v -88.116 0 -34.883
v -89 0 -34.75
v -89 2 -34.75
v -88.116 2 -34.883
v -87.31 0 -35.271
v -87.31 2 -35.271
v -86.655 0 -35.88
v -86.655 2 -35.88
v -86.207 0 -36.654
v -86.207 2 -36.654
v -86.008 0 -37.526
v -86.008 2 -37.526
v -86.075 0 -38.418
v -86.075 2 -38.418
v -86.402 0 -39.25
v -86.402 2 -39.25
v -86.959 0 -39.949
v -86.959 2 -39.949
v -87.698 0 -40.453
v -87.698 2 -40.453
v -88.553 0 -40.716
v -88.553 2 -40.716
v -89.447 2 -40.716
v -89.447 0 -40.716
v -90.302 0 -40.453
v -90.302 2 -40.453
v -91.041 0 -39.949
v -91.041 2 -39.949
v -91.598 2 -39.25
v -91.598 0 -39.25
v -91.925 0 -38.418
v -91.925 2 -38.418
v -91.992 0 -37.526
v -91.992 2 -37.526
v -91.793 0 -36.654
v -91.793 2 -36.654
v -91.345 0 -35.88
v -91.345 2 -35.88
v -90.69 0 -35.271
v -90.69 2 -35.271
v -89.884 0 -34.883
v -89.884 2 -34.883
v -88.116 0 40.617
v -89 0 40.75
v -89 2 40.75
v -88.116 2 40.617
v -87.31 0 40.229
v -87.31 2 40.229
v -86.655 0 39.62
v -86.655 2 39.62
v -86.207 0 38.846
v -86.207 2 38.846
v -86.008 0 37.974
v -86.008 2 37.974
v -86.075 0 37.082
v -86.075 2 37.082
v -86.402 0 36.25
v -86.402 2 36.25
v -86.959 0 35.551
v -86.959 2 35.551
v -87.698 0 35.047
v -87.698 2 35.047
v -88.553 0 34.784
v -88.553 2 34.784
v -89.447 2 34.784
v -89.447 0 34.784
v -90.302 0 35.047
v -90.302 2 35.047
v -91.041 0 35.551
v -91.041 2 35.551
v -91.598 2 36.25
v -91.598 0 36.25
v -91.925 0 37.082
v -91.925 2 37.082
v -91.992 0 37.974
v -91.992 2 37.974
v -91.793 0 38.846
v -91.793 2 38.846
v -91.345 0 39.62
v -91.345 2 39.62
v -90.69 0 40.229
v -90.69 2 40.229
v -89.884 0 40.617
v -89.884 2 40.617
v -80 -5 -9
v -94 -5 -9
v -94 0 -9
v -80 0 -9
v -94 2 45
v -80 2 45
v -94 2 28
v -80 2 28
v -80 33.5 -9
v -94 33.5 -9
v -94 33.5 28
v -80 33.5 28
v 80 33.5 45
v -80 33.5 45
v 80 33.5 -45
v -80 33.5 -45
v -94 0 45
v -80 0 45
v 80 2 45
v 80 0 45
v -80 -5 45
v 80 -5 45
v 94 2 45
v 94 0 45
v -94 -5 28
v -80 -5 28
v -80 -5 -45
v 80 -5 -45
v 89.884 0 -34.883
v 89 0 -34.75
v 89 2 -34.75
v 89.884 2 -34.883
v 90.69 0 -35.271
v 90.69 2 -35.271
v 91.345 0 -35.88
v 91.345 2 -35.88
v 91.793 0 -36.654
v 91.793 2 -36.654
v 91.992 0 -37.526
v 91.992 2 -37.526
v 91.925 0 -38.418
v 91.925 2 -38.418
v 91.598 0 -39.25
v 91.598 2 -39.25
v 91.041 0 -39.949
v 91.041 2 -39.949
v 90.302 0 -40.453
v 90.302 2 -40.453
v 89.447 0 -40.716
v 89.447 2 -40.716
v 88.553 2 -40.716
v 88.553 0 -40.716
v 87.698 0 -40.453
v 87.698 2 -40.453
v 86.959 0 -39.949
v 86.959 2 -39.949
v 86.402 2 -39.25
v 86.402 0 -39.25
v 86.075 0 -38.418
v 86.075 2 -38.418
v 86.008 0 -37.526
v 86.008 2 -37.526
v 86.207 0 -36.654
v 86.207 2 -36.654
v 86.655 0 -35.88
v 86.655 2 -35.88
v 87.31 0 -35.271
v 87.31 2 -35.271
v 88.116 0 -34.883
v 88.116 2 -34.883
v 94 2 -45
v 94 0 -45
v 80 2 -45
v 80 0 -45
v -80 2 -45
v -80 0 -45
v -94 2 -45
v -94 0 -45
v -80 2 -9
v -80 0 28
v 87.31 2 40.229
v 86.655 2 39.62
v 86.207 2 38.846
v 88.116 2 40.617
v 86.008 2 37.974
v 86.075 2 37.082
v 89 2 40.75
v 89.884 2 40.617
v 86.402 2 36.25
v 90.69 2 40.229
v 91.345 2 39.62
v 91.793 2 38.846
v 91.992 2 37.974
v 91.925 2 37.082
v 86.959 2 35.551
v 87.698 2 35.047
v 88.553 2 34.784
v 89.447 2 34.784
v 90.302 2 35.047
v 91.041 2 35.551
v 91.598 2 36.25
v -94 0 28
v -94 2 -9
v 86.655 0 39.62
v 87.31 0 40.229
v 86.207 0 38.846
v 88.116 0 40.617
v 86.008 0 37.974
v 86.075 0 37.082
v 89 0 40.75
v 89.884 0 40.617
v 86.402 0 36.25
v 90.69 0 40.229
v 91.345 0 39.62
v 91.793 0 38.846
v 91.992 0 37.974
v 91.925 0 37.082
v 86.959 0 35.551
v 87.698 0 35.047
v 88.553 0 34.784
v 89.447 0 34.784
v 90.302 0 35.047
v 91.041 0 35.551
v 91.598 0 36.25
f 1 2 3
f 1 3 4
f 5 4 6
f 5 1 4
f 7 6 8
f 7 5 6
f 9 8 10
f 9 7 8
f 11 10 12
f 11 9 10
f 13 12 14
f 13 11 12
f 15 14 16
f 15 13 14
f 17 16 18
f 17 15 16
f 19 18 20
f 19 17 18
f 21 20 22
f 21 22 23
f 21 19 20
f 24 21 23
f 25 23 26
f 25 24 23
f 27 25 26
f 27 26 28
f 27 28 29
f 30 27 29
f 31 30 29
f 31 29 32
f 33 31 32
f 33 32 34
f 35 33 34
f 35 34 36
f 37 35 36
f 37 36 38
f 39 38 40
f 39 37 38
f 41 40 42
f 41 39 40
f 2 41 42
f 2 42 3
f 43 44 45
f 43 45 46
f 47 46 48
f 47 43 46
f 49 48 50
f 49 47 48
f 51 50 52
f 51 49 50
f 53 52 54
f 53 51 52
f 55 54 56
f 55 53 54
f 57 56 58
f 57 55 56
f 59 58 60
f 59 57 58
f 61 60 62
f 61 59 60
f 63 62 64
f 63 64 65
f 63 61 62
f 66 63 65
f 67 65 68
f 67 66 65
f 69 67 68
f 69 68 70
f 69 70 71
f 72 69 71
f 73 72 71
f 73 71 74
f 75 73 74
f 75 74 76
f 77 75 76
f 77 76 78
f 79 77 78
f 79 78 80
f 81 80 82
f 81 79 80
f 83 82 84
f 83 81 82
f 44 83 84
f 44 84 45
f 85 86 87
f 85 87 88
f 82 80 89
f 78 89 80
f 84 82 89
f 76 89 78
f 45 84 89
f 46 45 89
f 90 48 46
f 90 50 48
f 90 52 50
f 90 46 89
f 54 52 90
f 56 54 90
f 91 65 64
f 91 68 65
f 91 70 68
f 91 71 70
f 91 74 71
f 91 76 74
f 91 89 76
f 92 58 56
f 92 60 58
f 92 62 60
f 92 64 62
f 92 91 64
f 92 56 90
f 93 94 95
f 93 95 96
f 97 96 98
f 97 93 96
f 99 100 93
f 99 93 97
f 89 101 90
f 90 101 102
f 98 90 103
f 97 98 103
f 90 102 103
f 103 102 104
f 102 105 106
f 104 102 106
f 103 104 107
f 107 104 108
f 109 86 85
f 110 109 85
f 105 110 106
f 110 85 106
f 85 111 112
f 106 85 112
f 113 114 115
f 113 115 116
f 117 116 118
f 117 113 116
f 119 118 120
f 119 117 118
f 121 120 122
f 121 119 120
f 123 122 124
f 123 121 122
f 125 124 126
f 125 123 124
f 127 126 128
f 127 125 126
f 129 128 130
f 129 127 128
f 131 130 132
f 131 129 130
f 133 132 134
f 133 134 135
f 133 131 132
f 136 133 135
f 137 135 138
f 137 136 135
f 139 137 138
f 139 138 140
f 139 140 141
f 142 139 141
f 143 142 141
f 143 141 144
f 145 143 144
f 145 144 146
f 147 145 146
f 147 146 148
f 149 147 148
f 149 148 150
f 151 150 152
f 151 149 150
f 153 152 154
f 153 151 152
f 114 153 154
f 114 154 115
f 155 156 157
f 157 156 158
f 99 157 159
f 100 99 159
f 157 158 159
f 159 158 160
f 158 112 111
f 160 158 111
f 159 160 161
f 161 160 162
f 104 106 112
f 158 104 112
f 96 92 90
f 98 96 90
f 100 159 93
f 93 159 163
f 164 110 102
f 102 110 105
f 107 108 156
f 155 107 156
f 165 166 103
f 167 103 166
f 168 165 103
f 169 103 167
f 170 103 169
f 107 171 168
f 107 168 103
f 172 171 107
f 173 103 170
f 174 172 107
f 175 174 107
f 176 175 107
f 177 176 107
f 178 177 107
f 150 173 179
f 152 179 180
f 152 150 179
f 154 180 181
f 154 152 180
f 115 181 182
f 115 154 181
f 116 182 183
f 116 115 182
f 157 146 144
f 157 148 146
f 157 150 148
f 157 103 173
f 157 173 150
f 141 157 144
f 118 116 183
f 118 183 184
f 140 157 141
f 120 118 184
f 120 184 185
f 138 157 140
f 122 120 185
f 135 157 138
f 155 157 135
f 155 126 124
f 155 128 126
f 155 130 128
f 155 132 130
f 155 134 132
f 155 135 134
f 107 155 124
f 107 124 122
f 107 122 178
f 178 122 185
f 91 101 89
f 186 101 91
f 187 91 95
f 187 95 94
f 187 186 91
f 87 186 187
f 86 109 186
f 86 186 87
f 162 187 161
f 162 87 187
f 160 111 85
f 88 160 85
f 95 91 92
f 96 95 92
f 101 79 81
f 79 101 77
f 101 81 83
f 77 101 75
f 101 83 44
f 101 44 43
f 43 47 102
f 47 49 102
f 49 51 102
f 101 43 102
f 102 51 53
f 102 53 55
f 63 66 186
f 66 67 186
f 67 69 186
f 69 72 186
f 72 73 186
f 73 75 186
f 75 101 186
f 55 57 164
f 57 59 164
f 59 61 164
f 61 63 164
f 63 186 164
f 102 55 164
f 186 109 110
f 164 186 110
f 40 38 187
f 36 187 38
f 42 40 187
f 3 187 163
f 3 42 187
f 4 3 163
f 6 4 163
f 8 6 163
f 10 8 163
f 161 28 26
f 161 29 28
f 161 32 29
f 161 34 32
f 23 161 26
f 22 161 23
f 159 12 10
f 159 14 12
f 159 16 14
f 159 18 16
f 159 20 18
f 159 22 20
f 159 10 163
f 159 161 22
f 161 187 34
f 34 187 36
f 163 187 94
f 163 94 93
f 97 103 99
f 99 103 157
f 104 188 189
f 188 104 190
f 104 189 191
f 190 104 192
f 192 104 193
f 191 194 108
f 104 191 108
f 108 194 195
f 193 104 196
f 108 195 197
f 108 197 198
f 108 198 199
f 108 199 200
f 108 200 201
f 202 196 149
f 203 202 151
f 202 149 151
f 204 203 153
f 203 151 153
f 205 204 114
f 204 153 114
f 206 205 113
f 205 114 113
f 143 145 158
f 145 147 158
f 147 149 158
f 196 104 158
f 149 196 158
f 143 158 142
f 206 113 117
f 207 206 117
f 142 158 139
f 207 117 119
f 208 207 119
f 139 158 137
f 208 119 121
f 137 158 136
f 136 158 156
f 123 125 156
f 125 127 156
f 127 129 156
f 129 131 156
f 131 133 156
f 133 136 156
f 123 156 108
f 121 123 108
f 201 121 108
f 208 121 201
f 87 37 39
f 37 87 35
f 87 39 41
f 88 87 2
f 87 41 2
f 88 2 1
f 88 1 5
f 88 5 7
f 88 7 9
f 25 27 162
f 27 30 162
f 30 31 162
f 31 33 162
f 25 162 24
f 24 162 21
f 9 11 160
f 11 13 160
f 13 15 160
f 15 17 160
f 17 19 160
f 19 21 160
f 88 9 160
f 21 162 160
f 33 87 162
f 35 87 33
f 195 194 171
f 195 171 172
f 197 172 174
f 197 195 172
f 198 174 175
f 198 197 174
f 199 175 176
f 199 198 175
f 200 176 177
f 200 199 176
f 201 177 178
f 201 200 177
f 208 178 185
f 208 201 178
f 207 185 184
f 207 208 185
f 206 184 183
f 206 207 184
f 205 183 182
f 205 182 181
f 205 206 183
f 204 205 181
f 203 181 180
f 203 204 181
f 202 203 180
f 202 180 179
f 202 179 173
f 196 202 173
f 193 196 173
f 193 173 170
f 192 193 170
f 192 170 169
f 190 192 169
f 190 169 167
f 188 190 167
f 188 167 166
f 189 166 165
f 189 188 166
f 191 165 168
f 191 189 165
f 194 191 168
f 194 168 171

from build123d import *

# Parameters (mm, degrees)
SKETCH1_W                = 188
SKETCH1_H                = 90
SKETCH1_R                = 3
BOSS_EXTRUDE1_DEPTH      = 2
BOSS_EXTRUDE2_DEPTH      = 31.5
BOSS_EXTRUDE2_DEPTH_BACK = 7
SKETCH2_W                = 14
SKETCH2_H                = 37


with BuildPart() as part:
    # Sketch1 → Boss-Extrude1 (new body)
    with BuildSketch(Plane(origin=(0, 0, 0), x_dir=(1, 0, 0), z_dir=(0, 1, 0))):
        Rectangle(SKETCH1_W, SKETCH1_H)
        with Locations(Location((-89, 37.75, 0), (0, 0, 270))):
            Circle(SKETCH1_R, mode=Mode.SUBTRACT)
        with Locations(Location((89, 37.75, 0), (0, 0, 270))):
            Circle(SKETCH1_R, mode=Mode.SUBTRACT)
        with Locations(Location((89, -37.75, 0), (0, 0, 270))):
            Circle(SKETCH1_R, mode=Mode.SUBTRACT)
        with Locations(Location((-89, -37.75, 0), (0, 0, 270))):
            Circle(SKETCH1_R, mode=Mode.SUBTRACT)
    extrude(amount=BOSS_EXTRUDE1_DEPTH)

    # Sketch2 → Boss-Extrude2 (add, two sides: drawn at the far end of the back side and taken through both)
    with BuildSketch(Plane(origin=(0, 2, 0), x_dir=(1, 0, 0), z_dir=(0, 1, 0)).offset(-BOSS_EXTRUDE2_DEPTH_BACK)):
        Polygon((-80, -28), (-80, -45), (80, -45), (80, 45), (-80, 45), (-80, 9), align=None)
        with Locations((-87, -9.5)):
            Rectangle(SKETCH2_W, SKETCH2_H)
    extrude(amount=BOSS_EXTRUDE2_DEPTH + BOSS_EXTRUDE2_DEPTH_BACK)


solid = part.part
